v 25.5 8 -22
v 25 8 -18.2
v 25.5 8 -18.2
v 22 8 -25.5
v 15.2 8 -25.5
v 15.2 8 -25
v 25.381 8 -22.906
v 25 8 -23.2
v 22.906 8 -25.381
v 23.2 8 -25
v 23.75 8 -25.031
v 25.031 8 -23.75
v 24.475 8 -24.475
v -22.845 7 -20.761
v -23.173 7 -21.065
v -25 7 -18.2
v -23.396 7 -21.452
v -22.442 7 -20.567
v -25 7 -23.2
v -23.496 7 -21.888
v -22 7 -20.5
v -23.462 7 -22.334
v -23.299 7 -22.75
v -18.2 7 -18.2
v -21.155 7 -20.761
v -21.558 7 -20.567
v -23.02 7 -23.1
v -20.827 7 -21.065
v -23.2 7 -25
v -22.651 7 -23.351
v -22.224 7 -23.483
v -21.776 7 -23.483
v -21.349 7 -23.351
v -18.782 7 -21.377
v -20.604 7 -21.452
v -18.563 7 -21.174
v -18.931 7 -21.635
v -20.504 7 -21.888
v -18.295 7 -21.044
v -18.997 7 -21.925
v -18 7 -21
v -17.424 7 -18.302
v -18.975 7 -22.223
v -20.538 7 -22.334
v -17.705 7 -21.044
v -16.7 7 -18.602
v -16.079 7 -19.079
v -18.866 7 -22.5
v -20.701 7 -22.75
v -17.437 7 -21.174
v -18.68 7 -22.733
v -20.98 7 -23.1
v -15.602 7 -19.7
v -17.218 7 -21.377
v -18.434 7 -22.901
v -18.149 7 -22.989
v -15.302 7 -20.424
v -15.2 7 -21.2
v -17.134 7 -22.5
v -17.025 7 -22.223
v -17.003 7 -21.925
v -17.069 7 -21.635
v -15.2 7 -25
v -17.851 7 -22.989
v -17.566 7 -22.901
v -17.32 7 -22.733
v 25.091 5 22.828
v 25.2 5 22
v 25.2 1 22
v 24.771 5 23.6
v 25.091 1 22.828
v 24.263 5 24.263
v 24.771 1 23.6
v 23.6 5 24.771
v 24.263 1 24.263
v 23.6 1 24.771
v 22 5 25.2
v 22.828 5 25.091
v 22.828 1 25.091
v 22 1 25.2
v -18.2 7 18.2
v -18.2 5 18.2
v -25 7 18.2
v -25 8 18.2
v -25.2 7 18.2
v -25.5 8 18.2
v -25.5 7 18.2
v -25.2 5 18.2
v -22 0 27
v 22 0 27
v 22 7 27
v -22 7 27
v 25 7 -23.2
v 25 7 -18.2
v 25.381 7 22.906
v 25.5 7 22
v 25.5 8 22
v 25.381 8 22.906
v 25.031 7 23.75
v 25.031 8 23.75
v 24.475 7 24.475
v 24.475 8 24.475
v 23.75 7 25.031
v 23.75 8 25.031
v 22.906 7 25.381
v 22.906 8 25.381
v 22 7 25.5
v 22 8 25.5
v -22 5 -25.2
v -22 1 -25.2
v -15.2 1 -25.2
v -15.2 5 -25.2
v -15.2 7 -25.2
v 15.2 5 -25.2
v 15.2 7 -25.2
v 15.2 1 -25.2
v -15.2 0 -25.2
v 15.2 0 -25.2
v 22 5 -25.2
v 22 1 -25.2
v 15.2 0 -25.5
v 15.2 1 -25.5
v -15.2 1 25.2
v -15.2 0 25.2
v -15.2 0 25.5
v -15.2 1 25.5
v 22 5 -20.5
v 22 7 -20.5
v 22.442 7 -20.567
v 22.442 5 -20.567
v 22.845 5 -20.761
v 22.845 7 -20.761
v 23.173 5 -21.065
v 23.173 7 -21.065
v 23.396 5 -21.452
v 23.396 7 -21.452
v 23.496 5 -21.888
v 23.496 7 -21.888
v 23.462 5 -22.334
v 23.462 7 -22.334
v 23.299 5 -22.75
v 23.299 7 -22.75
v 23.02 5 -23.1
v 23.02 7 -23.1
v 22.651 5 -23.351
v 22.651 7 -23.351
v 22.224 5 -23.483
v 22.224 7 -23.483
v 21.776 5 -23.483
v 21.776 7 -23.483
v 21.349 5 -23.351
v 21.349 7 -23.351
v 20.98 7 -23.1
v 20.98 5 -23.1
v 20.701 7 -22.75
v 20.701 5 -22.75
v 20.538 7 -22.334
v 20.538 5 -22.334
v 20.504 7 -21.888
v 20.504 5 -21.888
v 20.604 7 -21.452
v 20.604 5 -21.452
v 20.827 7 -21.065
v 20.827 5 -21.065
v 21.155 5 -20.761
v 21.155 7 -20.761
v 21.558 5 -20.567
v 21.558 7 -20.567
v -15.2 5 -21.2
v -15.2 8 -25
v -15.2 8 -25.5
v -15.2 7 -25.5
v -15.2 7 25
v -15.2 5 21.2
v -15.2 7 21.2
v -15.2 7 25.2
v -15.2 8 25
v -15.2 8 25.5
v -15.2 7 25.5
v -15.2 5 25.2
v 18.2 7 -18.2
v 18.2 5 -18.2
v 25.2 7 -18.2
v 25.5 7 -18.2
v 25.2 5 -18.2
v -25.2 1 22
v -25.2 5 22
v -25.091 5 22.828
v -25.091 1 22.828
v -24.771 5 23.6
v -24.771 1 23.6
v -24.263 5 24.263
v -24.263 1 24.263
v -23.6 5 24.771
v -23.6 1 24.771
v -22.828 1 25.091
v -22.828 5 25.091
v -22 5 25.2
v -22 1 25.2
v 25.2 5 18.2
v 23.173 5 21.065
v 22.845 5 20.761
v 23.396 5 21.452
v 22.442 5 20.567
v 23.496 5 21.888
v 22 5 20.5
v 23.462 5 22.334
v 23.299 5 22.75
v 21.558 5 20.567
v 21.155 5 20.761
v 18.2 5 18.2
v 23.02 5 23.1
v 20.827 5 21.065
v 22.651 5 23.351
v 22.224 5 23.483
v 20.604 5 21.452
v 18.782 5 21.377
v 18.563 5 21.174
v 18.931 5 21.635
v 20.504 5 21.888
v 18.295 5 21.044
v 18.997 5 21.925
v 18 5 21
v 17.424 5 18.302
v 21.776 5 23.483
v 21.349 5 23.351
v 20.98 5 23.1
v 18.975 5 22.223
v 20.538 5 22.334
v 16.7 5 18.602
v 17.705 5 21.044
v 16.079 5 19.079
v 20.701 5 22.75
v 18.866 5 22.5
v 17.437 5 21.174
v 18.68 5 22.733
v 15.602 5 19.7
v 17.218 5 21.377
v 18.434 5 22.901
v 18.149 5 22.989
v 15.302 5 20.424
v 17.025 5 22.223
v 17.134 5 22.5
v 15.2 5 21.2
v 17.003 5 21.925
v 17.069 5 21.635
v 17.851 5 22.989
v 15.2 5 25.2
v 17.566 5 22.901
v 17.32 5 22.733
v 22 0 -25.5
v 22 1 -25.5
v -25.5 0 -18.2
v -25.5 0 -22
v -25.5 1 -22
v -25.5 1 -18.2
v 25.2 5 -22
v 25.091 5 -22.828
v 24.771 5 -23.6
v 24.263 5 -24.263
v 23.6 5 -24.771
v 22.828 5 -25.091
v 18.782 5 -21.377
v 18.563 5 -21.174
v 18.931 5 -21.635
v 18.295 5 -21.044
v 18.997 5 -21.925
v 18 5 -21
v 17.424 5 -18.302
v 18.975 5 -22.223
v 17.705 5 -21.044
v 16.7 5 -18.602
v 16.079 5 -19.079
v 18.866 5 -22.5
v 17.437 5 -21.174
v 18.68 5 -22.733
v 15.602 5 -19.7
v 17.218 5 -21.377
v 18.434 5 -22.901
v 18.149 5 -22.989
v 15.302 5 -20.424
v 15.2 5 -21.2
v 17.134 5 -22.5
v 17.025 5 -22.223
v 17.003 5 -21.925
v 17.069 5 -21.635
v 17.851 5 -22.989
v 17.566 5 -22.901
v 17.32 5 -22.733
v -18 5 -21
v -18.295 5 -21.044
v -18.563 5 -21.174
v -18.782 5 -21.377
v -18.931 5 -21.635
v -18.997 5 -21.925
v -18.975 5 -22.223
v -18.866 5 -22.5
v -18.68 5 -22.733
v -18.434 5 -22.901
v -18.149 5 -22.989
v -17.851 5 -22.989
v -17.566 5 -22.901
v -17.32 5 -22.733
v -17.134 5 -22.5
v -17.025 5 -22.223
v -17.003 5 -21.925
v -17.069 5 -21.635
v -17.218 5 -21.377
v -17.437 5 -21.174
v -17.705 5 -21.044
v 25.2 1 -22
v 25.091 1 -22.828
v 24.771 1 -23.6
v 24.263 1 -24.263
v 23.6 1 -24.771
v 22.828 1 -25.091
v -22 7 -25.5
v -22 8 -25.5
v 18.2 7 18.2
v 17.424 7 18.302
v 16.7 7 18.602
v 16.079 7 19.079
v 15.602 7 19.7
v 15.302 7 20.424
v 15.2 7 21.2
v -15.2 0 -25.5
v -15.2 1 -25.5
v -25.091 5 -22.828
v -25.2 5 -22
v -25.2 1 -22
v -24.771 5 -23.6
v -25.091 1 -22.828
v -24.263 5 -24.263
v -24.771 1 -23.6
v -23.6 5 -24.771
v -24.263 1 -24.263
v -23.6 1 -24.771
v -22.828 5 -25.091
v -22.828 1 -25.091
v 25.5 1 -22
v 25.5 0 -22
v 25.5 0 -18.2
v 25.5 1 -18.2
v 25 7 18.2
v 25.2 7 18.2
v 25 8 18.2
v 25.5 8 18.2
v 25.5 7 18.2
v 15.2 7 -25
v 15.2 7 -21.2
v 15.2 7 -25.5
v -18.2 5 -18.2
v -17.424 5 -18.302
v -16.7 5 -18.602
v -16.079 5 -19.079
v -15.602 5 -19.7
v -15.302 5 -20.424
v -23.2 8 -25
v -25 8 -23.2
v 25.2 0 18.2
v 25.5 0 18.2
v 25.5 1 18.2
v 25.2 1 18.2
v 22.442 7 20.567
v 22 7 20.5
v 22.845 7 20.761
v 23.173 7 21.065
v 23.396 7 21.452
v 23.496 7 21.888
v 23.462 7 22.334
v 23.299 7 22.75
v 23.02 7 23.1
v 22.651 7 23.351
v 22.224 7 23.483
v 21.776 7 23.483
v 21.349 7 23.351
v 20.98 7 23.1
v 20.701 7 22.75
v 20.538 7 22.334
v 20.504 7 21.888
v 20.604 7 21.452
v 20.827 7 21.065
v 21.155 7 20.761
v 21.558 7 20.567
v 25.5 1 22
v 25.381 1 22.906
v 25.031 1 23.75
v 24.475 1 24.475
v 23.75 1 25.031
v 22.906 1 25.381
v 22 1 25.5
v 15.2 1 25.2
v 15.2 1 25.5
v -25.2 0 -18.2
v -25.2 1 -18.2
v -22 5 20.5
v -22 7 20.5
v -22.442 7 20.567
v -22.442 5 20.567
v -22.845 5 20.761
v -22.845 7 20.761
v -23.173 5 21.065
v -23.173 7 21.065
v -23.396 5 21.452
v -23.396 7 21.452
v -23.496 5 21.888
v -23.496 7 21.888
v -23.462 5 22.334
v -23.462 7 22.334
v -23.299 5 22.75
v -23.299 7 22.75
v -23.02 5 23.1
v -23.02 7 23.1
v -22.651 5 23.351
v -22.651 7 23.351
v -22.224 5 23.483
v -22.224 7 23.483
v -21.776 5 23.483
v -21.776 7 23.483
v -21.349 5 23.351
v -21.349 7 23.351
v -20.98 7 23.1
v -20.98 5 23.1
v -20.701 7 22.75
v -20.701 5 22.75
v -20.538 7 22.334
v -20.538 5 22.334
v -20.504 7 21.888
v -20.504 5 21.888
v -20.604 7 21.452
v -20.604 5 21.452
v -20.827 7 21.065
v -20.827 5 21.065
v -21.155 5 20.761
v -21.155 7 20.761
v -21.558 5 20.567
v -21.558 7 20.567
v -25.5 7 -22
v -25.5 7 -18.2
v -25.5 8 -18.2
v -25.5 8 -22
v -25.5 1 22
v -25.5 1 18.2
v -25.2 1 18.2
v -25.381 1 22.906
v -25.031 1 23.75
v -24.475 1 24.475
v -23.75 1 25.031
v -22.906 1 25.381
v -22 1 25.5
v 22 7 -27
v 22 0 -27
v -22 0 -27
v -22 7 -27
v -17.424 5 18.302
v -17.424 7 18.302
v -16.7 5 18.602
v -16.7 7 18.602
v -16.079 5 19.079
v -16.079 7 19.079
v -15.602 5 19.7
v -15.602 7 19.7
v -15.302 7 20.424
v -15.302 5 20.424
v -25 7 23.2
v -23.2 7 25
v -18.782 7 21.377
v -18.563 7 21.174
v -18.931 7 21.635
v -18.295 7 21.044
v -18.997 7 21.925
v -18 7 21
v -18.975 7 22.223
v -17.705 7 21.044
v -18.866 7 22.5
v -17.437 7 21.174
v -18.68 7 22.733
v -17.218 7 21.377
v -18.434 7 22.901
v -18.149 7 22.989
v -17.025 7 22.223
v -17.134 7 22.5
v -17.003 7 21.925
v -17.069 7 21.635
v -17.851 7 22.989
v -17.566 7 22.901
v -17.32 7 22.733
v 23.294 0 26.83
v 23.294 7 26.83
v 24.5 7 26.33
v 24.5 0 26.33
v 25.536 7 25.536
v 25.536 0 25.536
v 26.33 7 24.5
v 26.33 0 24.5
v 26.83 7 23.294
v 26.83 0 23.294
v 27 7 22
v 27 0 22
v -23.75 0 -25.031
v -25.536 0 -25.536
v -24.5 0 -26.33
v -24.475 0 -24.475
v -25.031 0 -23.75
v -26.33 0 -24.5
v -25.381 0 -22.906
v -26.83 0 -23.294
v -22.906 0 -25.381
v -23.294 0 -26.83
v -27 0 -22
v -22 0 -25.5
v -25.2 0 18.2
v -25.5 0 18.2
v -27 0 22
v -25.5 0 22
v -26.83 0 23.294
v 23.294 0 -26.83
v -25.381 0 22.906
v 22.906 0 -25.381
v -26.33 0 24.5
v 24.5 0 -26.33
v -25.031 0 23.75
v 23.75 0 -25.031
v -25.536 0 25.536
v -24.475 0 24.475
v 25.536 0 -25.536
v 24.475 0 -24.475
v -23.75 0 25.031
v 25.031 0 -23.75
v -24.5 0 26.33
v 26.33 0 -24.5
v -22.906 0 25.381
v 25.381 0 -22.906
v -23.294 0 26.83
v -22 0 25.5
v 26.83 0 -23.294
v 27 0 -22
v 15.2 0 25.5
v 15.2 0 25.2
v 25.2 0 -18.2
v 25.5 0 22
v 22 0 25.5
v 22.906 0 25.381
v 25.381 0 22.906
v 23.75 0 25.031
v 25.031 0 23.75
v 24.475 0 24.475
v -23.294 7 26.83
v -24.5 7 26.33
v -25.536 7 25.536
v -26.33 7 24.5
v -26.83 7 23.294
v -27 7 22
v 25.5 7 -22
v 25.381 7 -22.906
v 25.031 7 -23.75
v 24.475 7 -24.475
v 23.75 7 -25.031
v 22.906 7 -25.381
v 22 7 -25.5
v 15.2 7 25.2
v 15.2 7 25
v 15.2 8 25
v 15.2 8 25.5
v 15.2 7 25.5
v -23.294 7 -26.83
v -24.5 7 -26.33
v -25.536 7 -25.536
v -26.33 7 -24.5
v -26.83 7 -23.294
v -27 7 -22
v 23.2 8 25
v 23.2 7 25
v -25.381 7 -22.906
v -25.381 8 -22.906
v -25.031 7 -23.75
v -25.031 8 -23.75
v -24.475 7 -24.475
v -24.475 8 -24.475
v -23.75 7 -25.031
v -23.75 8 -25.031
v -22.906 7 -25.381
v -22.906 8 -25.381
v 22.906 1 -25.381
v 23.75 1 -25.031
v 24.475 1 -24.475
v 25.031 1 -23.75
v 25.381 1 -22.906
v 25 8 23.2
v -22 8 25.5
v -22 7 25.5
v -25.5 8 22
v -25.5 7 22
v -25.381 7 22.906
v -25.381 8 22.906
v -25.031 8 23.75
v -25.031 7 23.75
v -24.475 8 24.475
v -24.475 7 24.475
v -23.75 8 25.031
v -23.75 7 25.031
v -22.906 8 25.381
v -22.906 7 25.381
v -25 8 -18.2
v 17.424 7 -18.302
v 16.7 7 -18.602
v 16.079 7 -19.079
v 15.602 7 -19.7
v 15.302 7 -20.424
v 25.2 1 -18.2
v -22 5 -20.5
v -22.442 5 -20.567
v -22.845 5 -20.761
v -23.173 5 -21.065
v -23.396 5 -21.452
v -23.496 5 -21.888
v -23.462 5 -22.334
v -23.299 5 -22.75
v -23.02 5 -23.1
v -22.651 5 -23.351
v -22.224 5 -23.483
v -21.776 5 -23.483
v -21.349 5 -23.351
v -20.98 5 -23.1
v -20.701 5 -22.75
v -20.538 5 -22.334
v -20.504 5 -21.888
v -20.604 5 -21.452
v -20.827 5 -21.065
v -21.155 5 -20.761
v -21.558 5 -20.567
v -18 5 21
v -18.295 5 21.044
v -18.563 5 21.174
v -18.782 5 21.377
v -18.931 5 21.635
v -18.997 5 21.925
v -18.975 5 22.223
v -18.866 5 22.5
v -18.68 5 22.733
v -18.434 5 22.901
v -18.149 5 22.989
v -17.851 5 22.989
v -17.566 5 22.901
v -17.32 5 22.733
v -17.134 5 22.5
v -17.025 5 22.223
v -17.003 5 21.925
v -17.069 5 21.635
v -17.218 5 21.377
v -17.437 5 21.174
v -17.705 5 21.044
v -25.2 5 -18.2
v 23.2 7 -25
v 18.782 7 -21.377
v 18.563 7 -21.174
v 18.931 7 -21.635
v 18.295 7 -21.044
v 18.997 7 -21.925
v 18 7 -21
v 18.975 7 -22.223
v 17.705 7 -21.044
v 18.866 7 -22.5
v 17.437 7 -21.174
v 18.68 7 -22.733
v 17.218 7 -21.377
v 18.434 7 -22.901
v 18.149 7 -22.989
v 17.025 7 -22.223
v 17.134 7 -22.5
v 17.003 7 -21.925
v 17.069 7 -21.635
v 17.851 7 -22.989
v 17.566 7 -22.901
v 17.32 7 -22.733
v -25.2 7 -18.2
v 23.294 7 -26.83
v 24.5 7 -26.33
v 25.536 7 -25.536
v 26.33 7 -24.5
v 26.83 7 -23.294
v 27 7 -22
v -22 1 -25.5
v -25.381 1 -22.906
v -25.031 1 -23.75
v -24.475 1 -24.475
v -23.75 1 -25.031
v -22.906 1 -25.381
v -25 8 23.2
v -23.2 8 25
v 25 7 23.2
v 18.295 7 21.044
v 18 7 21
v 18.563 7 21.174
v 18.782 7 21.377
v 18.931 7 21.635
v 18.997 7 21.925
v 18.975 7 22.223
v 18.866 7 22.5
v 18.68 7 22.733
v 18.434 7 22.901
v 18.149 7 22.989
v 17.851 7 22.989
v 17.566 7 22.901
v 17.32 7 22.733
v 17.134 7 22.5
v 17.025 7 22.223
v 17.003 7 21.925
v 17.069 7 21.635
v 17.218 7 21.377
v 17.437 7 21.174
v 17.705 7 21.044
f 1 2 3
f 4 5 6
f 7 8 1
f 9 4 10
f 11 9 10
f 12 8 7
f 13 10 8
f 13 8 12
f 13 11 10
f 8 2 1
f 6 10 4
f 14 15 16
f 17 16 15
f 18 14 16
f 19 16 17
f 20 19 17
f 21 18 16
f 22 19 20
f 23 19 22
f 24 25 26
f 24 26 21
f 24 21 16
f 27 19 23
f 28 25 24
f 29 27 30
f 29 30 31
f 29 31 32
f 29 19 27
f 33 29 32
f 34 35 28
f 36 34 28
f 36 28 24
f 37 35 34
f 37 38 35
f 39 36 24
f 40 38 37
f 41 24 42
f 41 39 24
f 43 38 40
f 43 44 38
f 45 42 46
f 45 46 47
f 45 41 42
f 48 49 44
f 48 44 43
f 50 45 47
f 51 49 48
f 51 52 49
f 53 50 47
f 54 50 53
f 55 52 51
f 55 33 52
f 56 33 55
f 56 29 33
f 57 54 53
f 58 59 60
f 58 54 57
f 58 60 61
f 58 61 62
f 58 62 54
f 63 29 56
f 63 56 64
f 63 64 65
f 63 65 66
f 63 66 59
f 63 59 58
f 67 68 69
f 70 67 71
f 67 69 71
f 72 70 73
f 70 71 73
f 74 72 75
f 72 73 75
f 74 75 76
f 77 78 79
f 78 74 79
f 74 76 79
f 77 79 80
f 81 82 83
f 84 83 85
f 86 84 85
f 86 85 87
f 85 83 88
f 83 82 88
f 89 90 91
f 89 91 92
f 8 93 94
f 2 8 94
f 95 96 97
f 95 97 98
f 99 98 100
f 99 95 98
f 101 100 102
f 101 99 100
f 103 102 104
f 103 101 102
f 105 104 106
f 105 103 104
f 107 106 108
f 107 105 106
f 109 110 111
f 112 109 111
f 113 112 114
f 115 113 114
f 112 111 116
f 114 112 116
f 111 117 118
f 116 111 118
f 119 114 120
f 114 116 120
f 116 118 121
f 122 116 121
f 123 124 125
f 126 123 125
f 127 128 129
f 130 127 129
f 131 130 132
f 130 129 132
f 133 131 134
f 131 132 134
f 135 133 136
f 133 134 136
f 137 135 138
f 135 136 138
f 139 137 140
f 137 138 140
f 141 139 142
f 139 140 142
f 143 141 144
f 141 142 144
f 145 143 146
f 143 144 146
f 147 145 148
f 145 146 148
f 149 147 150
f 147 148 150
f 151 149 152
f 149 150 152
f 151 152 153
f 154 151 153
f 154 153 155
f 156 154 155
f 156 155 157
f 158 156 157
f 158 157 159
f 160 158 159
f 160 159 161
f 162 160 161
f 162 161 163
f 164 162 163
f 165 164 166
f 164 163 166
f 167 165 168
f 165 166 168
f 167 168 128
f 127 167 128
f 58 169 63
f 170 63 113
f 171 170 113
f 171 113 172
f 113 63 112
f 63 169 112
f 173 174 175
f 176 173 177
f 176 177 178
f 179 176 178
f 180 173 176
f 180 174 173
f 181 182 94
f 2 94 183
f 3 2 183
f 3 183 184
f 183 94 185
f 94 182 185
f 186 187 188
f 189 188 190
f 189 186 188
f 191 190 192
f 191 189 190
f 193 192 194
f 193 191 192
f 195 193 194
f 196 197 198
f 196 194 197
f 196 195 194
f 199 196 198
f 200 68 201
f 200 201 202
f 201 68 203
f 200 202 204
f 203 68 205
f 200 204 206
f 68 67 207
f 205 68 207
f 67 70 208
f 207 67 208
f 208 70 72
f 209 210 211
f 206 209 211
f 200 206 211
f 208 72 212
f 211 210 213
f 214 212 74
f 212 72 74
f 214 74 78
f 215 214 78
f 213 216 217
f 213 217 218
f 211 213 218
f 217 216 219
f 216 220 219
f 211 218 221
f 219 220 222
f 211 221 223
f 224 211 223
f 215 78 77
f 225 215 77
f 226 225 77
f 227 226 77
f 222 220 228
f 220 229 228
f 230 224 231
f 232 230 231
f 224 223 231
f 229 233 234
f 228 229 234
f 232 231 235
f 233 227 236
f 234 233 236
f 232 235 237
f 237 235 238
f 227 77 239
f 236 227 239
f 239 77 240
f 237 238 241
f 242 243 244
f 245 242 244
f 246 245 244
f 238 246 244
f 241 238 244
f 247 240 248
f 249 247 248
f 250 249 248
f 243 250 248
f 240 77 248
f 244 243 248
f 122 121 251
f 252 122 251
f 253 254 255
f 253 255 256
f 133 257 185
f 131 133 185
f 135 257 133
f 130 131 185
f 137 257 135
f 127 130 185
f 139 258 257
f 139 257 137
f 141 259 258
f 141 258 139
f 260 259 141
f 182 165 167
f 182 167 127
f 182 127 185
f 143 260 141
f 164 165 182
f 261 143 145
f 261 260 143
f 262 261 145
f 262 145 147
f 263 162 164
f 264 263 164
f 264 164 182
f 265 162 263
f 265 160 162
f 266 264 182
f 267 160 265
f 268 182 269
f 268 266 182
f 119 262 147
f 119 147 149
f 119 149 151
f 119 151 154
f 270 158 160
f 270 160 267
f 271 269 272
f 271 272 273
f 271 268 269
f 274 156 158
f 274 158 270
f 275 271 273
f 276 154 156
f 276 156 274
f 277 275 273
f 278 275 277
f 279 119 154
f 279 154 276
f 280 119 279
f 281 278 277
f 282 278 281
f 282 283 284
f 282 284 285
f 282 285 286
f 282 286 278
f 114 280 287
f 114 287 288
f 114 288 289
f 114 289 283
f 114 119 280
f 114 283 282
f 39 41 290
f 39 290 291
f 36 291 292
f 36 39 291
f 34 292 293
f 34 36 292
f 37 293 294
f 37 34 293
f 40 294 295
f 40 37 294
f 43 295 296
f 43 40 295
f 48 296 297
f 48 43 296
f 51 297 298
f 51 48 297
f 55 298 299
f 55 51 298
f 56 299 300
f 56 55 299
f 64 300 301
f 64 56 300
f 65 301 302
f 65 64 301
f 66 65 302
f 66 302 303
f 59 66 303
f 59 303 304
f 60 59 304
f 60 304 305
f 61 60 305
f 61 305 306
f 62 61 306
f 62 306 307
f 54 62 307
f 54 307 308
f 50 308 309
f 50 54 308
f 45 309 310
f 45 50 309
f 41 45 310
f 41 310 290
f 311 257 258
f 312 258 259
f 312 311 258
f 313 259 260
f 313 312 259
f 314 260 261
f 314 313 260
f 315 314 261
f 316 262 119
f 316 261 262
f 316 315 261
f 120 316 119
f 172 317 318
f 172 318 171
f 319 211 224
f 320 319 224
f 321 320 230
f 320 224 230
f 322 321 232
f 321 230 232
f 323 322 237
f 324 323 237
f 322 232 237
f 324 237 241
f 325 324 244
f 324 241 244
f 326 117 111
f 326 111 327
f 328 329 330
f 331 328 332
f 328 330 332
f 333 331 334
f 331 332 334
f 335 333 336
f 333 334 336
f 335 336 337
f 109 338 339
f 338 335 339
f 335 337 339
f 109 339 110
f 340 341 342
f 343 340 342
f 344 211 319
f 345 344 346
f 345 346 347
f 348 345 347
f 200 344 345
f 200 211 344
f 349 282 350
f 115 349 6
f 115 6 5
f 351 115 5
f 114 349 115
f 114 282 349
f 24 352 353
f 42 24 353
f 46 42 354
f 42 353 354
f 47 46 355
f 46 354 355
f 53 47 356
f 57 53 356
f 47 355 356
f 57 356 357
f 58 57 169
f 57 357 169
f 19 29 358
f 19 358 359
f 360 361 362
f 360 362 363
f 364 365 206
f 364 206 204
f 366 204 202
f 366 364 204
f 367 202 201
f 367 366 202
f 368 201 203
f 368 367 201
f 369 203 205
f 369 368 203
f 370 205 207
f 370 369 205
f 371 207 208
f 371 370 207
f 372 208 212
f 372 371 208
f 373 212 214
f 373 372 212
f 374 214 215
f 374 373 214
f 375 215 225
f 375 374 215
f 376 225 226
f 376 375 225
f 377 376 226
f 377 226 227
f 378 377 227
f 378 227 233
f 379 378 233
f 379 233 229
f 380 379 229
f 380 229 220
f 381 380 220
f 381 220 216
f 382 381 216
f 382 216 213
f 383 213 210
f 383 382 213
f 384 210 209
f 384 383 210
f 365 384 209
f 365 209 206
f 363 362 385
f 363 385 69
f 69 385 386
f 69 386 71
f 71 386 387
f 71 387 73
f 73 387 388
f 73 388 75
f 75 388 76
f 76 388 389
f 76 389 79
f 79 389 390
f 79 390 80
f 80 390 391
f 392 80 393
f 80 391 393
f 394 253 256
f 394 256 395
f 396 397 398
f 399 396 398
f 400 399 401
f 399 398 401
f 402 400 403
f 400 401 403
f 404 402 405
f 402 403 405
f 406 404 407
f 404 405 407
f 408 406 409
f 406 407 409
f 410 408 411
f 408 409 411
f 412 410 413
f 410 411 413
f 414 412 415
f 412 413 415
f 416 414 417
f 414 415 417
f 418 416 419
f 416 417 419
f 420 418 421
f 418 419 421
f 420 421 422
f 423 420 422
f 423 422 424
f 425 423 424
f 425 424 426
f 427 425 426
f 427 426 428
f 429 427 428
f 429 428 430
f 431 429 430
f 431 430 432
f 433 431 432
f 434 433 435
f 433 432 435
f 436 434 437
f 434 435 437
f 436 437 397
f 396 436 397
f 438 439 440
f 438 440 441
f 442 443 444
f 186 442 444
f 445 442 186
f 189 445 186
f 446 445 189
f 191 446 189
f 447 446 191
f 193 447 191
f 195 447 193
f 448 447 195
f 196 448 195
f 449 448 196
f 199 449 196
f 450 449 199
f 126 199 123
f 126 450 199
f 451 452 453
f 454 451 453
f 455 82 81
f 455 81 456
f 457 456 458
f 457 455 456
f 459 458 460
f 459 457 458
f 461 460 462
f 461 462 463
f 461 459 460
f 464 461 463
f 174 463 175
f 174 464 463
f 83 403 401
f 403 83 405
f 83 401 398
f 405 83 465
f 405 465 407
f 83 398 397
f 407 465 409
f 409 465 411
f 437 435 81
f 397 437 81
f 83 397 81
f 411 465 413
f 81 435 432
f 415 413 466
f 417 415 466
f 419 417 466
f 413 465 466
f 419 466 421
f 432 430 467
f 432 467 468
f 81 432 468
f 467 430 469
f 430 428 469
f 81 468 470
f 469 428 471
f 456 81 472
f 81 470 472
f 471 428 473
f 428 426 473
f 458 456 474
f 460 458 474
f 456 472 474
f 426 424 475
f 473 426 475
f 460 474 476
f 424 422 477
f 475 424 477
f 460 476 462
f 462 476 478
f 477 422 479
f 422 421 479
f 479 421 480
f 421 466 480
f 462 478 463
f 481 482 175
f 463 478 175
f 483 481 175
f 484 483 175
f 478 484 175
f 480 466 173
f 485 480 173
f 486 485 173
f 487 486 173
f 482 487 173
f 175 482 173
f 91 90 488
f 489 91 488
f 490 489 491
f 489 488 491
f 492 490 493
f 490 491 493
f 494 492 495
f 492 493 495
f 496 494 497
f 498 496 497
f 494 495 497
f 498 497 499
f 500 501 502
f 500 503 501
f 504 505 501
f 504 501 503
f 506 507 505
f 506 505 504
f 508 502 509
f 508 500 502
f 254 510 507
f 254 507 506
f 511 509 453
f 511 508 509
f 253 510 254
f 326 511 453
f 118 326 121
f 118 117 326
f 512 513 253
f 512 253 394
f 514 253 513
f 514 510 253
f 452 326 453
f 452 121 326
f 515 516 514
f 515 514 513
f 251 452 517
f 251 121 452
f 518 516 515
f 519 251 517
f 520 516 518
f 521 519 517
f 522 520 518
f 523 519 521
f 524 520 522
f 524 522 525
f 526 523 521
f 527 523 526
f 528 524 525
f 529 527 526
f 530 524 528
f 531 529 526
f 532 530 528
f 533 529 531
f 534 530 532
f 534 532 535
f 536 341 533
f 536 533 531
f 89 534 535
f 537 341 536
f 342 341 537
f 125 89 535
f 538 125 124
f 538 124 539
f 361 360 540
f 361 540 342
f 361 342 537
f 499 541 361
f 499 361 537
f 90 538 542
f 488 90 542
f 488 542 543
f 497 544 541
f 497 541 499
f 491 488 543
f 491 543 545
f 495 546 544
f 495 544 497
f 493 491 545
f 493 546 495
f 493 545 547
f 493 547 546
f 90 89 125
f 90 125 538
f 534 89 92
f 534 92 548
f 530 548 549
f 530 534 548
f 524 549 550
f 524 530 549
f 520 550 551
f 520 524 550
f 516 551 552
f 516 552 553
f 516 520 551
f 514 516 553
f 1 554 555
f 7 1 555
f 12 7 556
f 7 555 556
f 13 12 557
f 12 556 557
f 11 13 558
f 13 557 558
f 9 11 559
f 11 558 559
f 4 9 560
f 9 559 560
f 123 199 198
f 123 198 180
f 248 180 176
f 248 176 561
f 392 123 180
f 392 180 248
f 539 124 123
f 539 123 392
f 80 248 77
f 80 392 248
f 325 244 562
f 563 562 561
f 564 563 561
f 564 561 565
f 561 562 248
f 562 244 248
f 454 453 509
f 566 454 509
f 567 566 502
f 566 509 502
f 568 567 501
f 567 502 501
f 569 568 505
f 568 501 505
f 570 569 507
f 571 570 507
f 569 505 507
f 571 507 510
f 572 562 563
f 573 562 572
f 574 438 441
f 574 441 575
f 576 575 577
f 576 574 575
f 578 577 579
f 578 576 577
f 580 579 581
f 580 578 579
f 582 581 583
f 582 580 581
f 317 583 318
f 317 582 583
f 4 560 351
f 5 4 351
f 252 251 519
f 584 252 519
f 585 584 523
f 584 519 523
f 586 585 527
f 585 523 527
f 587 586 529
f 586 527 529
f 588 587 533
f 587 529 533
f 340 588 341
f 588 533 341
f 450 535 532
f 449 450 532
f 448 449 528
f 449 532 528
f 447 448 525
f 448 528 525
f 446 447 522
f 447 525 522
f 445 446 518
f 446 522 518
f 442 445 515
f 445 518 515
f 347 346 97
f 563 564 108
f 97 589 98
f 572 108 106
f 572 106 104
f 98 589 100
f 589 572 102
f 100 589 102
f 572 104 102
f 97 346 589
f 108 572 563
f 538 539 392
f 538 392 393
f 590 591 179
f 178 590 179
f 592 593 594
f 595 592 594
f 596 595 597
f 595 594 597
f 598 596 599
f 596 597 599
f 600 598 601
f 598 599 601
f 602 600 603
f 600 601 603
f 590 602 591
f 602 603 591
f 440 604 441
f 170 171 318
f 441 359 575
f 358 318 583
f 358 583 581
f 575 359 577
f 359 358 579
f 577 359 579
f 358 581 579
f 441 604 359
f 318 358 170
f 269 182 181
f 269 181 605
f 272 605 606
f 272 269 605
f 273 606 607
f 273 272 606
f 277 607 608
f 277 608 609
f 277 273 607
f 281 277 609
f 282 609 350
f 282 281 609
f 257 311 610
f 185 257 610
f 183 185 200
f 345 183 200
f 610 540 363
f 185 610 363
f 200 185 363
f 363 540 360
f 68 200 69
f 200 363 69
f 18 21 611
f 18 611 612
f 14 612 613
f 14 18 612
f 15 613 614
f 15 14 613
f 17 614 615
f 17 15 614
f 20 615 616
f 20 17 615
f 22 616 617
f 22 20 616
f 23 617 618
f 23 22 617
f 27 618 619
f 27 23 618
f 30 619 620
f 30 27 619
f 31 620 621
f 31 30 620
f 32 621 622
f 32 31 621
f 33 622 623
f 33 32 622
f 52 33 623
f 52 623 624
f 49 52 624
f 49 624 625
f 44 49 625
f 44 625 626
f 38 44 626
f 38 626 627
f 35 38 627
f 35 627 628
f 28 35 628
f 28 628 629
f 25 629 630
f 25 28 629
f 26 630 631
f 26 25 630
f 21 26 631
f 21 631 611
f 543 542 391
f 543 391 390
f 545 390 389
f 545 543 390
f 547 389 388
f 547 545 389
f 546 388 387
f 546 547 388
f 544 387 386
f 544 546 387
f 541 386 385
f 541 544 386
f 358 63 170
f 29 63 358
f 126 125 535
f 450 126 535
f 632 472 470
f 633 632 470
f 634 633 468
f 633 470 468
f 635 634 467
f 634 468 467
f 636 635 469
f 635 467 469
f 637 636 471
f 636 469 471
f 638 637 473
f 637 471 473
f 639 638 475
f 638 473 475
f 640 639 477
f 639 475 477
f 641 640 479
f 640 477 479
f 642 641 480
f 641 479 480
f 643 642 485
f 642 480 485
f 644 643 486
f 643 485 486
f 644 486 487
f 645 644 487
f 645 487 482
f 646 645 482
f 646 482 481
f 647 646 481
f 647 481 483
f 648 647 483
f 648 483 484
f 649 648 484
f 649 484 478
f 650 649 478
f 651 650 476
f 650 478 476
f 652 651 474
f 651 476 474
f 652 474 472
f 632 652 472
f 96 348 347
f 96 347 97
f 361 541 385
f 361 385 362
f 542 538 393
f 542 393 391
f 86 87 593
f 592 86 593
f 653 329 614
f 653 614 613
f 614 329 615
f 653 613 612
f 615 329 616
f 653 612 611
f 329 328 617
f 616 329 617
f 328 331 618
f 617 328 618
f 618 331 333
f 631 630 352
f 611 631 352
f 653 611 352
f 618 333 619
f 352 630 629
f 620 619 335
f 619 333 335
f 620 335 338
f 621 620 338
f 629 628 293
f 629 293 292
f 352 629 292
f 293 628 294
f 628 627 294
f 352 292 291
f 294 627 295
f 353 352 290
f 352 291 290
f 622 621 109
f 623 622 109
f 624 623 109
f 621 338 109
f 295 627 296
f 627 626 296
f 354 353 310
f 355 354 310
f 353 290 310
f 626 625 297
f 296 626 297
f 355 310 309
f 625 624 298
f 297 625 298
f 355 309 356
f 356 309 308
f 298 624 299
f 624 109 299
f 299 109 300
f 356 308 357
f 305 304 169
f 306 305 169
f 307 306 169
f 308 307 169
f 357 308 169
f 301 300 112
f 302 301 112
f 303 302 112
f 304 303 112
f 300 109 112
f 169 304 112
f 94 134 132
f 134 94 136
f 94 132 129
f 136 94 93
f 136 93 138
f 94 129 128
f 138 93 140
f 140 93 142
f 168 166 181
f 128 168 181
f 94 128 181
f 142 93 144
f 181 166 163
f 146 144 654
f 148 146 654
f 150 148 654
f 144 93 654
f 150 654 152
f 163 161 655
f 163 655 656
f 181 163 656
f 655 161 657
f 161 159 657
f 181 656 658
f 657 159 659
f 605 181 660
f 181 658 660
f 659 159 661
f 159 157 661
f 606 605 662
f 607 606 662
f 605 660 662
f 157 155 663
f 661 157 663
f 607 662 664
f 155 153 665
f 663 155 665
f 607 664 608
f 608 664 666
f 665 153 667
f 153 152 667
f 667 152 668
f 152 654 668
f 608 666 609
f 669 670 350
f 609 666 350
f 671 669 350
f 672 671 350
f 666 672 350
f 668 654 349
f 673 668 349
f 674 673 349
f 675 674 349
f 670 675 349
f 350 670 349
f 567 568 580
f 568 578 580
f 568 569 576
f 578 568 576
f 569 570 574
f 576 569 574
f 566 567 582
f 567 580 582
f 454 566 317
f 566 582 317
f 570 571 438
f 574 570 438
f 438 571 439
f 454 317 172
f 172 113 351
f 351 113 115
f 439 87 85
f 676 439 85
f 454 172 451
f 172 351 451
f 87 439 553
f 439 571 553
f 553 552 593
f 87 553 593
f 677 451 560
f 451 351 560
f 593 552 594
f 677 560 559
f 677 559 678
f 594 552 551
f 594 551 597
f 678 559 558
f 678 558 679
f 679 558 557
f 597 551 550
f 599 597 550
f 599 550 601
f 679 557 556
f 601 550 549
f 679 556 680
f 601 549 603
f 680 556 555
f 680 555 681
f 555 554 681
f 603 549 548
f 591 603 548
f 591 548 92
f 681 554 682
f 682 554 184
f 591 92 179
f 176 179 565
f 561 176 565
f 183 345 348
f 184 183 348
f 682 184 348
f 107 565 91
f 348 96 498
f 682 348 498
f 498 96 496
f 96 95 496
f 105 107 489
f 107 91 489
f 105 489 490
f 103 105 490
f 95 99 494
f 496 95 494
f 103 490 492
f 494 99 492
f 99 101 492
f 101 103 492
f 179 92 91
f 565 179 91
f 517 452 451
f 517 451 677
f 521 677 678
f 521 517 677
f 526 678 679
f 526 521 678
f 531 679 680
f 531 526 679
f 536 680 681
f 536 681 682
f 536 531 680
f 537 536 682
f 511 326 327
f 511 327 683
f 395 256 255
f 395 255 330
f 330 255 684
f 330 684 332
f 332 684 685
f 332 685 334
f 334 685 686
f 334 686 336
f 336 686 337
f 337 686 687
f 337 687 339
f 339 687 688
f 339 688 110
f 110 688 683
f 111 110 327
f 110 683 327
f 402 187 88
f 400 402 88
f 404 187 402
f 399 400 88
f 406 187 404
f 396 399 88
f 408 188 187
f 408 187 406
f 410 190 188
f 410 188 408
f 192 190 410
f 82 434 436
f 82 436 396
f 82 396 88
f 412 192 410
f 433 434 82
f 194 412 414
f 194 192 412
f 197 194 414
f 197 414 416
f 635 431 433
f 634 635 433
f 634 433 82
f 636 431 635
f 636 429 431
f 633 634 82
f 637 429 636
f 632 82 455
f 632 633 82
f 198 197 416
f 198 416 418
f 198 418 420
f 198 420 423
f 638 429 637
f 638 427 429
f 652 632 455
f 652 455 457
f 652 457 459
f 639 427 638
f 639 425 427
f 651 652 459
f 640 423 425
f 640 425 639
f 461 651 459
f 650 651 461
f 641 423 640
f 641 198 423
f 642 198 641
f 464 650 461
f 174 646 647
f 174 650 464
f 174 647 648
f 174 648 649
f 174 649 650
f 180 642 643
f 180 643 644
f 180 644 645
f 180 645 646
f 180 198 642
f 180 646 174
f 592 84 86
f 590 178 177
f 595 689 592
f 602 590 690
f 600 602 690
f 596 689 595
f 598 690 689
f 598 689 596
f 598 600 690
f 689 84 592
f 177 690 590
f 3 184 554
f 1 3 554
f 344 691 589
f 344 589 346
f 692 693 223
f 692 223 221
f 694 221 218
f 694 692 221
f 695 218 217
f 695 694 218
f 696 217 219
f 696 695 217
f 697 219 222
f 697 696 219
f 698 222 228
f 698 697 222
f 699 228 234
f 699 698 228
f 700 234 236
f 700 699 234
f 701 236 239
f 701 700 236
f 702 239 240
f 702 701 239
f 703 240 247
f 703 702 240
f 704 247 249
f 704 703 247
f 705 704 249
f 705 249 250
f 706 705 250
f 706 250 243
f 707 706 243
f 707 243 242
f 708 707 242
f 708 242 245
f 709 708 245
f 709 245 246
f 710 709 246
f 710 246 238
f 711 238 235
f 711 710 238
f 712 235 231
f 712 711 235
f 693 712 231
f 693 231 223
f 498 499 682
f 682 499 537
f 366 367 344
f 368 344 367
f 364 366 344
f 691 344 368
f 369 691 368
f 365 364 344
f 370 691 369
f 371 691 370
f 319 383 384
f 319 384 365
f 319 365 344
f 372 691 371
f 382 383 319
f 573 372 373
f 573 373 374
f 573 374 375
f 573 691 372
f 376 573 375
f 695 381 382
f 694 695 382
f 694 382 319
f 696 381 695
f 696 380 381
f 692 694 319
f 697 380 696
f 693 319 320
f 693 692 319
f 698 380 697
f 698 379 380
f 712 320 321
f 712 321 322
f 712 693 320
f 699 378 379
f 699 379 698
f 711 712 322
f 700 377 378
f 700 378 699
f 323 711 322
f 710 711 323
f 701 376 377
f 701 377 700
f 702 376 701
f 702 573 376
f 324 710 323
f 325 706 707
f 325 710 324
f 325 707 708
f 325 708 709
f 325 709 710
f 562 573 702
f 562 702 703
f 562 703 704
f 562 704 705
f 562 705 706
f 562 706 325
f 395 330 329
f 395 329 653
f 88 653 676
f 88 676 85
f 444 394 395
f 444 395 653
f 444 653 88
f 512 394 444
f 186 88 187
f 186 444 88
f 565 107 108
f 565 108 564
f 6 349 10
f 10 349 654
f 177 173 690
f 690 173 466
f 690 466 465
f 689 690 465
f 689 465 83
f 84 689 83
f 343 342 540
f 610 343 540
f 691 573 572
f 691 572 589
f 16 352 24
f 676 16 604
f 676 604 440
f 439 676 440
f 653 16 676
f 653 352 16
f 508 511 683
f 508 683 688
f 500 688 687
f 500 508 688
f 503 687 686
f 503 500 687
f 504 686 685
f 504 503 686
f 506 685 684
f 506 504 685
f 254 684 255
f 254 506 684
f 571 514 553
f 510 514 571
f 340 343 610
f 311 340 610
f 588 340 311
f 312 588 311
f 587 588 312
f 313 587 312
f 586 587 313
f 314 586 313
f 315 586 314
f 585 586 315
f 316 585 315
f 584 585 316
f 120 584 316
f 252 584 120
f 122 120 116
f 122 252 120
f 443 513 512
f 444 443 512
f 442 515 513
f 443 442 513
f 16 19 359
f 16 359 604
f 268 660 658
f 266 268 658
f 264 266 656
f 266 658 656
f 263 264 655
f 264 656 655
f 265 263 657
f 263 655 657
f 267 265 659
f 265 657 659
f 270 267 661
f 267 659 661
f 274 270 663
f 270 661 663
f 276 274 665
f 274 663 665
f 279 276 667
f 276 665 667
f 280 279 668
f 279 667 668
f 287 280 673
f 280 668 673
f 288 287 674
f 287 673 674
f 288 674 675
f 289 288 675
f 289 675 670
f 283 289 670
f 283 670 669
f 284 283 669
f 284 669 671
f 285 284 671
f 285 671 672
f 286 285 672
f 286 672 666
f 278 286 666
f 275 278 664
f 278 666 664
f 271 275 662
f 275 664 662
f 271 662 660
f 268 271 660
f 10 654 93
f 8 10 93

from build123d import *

# Parameters (mm, degrees)
EXTRUDE_2_DEPTH     = 7
EXTRUDE_START       = -2
EXTRUDE_3_DEPTH     = 2
EXTRUDE_4_DEPTH     = 1
SKETCH_11_R         = 1.5
SKETCH_11_R_2       = 1
CUT_EXTRUDE_2_DEPTH = 2
CUT_EXTRUDE_3_DEPTH = 1


with BuildPart() as part:
    # ｽｹｯﾁ7 → ﾎﾞｽ - 押し出し2 (new body)
    with BuildSketch(Plane(origin=(0, 0, 0), x_dir=(1, 0, 0), z_dir=(0, 1, 0))):
        with BuildLine():
            Line((22, 25.2), (0, 25.2))
            Line((0, 25.2), (0, 27))
            Line((0, 27), (22, 27))
            ThreePointArc((22, 27), (25.535533906, 25.535533906), (27, 22))
            Line((27, 22), (27, 0))
            Line((27, 0), (25.2, 0))
            Line((25.2, 0), (25.2, 22))
            ThreePointArc((25.2, 22), (24.2627417, 24.2627417), (22, 25.2))
        make_face()
    extrude(amount=EXTRUDE_2_DEPTH)

    # ｽｹｯﾁ8 → ﾎﾞｽ - 押し出し3 (add)
    with BuildSketch(Plane(origin=(0, 7, 0), x_dir=(1, 0, 0), z_dir=(0, 1, 0)).offset(EXTRUDE_START)):
        with BuildLine():
            Line((15.2, 21.2), (15.2, 25.2))
            Line((15.2, 25.2), (22, 25.2))
            ThreePointArc((22, 25.2), (24.2627417, 24.2627417), (25.2, 22))
            Line((25.2, 22), (25.2, 18.2))
            Line((25.2, 18.2), (18.2, 18.2))
            ThreePointArc((18.2, 18.2), (16.078679656, 19.078679656), (15.2, 21.2))
        make_face()
    extrude(amount=EXTRUDE_3_DEPTH)

    # ｽｹｯﾁ10 → ﾎﾞｽ - 押し出し4 (add)
    with BuildSketch(Plane(origin=(0, 7, 0), x_dir=(1, 0, 0), z_dir=(0, 1, 0))):
        with BuildLine():
            Line((25, 23.2), (25, 18.2))
            Line((25, 18.2), (25.5, 18.2))
            Line((25.5, 18.2), (25.5, 22))
            ThreePointArc((25.5, 22), (24.474873734, 24.474873734), (22, 25.5))
            Line((22, 25.5), (15.2, 25.5))
            Line((15.2, 25.5), (15.2, 25))
            Line((15.2, 25), (23.2, 25))
            Line((23.2, 25), (25, 23.2))
        make_face()
    extrude(amount=EXTRUDE_4_DEPTH)

    # ｽｹｯﾁ11 → ｶｯﾄ - 押し出し2 (cut)
    with BuildSketch(Plane(origin=(0, 7, 0), x_dir=(1, 0, 0), z_dir=(0, 1, 0))):
        with Locations(Location((22, 22, 0), (0, 0, 270))):
            Circle(SKETCH_11_R)
        with Locations(Location((18, 22, 0), (0, 0, 270))):
            Circle(SKETCH_11_R_2)
    extrude(amount=-CUT_EXTRUDE_2_DEPTH, mode=Mode.SUBTRACT)

    # ｽｹｯﾁ12 → ｶｯﾄ - 押し出し3 (cut)
    with BuildSketch(Plane(origin=(0, 0, 0), x_dir=(-1, 0, 0), z_dir=(0, -1, 0))):
        with BuildLine():
            Line((-22, 25), (-15.2, 25))
            Line((-15.2, 25), (-15.2, 25.5))
            Line((-15.2, 25.5), (-22, 25.5))
            ThreePointArc((-22, 25.5), (-24.474873734, 24.474873734), (-25.5, 22))
            Line((-25.5, 22), (-25.5, 18.2))
            Line((-25.5, 18.2), (-25, 18.2))
            Line((-25, 18.2), (-25, 22))
            ThreePointArc((-25, 22), (-24.121320344, 24.121320344), (-22, 25))
        make_face()
    extrude(amount=-CUT_EXTRUDE_3_DEPTH, mode=Mode.SUBTRACT)

    # ﾐﾗｰ1: part across plane


with BuildPart() as part_1:
    add(part.part)
    add(part.part.mirror(Plane(origin=(0, 0, 0), x_dir=(0, 0, 1), z_dir=(1, 0, 0))))

    # ﾐﾗｰ2: part across plane


with BuildPart() as part_2:
    add(part_1.part)
    add(part_1.part.mirror(Plane.XY))


solid = part_2.part
